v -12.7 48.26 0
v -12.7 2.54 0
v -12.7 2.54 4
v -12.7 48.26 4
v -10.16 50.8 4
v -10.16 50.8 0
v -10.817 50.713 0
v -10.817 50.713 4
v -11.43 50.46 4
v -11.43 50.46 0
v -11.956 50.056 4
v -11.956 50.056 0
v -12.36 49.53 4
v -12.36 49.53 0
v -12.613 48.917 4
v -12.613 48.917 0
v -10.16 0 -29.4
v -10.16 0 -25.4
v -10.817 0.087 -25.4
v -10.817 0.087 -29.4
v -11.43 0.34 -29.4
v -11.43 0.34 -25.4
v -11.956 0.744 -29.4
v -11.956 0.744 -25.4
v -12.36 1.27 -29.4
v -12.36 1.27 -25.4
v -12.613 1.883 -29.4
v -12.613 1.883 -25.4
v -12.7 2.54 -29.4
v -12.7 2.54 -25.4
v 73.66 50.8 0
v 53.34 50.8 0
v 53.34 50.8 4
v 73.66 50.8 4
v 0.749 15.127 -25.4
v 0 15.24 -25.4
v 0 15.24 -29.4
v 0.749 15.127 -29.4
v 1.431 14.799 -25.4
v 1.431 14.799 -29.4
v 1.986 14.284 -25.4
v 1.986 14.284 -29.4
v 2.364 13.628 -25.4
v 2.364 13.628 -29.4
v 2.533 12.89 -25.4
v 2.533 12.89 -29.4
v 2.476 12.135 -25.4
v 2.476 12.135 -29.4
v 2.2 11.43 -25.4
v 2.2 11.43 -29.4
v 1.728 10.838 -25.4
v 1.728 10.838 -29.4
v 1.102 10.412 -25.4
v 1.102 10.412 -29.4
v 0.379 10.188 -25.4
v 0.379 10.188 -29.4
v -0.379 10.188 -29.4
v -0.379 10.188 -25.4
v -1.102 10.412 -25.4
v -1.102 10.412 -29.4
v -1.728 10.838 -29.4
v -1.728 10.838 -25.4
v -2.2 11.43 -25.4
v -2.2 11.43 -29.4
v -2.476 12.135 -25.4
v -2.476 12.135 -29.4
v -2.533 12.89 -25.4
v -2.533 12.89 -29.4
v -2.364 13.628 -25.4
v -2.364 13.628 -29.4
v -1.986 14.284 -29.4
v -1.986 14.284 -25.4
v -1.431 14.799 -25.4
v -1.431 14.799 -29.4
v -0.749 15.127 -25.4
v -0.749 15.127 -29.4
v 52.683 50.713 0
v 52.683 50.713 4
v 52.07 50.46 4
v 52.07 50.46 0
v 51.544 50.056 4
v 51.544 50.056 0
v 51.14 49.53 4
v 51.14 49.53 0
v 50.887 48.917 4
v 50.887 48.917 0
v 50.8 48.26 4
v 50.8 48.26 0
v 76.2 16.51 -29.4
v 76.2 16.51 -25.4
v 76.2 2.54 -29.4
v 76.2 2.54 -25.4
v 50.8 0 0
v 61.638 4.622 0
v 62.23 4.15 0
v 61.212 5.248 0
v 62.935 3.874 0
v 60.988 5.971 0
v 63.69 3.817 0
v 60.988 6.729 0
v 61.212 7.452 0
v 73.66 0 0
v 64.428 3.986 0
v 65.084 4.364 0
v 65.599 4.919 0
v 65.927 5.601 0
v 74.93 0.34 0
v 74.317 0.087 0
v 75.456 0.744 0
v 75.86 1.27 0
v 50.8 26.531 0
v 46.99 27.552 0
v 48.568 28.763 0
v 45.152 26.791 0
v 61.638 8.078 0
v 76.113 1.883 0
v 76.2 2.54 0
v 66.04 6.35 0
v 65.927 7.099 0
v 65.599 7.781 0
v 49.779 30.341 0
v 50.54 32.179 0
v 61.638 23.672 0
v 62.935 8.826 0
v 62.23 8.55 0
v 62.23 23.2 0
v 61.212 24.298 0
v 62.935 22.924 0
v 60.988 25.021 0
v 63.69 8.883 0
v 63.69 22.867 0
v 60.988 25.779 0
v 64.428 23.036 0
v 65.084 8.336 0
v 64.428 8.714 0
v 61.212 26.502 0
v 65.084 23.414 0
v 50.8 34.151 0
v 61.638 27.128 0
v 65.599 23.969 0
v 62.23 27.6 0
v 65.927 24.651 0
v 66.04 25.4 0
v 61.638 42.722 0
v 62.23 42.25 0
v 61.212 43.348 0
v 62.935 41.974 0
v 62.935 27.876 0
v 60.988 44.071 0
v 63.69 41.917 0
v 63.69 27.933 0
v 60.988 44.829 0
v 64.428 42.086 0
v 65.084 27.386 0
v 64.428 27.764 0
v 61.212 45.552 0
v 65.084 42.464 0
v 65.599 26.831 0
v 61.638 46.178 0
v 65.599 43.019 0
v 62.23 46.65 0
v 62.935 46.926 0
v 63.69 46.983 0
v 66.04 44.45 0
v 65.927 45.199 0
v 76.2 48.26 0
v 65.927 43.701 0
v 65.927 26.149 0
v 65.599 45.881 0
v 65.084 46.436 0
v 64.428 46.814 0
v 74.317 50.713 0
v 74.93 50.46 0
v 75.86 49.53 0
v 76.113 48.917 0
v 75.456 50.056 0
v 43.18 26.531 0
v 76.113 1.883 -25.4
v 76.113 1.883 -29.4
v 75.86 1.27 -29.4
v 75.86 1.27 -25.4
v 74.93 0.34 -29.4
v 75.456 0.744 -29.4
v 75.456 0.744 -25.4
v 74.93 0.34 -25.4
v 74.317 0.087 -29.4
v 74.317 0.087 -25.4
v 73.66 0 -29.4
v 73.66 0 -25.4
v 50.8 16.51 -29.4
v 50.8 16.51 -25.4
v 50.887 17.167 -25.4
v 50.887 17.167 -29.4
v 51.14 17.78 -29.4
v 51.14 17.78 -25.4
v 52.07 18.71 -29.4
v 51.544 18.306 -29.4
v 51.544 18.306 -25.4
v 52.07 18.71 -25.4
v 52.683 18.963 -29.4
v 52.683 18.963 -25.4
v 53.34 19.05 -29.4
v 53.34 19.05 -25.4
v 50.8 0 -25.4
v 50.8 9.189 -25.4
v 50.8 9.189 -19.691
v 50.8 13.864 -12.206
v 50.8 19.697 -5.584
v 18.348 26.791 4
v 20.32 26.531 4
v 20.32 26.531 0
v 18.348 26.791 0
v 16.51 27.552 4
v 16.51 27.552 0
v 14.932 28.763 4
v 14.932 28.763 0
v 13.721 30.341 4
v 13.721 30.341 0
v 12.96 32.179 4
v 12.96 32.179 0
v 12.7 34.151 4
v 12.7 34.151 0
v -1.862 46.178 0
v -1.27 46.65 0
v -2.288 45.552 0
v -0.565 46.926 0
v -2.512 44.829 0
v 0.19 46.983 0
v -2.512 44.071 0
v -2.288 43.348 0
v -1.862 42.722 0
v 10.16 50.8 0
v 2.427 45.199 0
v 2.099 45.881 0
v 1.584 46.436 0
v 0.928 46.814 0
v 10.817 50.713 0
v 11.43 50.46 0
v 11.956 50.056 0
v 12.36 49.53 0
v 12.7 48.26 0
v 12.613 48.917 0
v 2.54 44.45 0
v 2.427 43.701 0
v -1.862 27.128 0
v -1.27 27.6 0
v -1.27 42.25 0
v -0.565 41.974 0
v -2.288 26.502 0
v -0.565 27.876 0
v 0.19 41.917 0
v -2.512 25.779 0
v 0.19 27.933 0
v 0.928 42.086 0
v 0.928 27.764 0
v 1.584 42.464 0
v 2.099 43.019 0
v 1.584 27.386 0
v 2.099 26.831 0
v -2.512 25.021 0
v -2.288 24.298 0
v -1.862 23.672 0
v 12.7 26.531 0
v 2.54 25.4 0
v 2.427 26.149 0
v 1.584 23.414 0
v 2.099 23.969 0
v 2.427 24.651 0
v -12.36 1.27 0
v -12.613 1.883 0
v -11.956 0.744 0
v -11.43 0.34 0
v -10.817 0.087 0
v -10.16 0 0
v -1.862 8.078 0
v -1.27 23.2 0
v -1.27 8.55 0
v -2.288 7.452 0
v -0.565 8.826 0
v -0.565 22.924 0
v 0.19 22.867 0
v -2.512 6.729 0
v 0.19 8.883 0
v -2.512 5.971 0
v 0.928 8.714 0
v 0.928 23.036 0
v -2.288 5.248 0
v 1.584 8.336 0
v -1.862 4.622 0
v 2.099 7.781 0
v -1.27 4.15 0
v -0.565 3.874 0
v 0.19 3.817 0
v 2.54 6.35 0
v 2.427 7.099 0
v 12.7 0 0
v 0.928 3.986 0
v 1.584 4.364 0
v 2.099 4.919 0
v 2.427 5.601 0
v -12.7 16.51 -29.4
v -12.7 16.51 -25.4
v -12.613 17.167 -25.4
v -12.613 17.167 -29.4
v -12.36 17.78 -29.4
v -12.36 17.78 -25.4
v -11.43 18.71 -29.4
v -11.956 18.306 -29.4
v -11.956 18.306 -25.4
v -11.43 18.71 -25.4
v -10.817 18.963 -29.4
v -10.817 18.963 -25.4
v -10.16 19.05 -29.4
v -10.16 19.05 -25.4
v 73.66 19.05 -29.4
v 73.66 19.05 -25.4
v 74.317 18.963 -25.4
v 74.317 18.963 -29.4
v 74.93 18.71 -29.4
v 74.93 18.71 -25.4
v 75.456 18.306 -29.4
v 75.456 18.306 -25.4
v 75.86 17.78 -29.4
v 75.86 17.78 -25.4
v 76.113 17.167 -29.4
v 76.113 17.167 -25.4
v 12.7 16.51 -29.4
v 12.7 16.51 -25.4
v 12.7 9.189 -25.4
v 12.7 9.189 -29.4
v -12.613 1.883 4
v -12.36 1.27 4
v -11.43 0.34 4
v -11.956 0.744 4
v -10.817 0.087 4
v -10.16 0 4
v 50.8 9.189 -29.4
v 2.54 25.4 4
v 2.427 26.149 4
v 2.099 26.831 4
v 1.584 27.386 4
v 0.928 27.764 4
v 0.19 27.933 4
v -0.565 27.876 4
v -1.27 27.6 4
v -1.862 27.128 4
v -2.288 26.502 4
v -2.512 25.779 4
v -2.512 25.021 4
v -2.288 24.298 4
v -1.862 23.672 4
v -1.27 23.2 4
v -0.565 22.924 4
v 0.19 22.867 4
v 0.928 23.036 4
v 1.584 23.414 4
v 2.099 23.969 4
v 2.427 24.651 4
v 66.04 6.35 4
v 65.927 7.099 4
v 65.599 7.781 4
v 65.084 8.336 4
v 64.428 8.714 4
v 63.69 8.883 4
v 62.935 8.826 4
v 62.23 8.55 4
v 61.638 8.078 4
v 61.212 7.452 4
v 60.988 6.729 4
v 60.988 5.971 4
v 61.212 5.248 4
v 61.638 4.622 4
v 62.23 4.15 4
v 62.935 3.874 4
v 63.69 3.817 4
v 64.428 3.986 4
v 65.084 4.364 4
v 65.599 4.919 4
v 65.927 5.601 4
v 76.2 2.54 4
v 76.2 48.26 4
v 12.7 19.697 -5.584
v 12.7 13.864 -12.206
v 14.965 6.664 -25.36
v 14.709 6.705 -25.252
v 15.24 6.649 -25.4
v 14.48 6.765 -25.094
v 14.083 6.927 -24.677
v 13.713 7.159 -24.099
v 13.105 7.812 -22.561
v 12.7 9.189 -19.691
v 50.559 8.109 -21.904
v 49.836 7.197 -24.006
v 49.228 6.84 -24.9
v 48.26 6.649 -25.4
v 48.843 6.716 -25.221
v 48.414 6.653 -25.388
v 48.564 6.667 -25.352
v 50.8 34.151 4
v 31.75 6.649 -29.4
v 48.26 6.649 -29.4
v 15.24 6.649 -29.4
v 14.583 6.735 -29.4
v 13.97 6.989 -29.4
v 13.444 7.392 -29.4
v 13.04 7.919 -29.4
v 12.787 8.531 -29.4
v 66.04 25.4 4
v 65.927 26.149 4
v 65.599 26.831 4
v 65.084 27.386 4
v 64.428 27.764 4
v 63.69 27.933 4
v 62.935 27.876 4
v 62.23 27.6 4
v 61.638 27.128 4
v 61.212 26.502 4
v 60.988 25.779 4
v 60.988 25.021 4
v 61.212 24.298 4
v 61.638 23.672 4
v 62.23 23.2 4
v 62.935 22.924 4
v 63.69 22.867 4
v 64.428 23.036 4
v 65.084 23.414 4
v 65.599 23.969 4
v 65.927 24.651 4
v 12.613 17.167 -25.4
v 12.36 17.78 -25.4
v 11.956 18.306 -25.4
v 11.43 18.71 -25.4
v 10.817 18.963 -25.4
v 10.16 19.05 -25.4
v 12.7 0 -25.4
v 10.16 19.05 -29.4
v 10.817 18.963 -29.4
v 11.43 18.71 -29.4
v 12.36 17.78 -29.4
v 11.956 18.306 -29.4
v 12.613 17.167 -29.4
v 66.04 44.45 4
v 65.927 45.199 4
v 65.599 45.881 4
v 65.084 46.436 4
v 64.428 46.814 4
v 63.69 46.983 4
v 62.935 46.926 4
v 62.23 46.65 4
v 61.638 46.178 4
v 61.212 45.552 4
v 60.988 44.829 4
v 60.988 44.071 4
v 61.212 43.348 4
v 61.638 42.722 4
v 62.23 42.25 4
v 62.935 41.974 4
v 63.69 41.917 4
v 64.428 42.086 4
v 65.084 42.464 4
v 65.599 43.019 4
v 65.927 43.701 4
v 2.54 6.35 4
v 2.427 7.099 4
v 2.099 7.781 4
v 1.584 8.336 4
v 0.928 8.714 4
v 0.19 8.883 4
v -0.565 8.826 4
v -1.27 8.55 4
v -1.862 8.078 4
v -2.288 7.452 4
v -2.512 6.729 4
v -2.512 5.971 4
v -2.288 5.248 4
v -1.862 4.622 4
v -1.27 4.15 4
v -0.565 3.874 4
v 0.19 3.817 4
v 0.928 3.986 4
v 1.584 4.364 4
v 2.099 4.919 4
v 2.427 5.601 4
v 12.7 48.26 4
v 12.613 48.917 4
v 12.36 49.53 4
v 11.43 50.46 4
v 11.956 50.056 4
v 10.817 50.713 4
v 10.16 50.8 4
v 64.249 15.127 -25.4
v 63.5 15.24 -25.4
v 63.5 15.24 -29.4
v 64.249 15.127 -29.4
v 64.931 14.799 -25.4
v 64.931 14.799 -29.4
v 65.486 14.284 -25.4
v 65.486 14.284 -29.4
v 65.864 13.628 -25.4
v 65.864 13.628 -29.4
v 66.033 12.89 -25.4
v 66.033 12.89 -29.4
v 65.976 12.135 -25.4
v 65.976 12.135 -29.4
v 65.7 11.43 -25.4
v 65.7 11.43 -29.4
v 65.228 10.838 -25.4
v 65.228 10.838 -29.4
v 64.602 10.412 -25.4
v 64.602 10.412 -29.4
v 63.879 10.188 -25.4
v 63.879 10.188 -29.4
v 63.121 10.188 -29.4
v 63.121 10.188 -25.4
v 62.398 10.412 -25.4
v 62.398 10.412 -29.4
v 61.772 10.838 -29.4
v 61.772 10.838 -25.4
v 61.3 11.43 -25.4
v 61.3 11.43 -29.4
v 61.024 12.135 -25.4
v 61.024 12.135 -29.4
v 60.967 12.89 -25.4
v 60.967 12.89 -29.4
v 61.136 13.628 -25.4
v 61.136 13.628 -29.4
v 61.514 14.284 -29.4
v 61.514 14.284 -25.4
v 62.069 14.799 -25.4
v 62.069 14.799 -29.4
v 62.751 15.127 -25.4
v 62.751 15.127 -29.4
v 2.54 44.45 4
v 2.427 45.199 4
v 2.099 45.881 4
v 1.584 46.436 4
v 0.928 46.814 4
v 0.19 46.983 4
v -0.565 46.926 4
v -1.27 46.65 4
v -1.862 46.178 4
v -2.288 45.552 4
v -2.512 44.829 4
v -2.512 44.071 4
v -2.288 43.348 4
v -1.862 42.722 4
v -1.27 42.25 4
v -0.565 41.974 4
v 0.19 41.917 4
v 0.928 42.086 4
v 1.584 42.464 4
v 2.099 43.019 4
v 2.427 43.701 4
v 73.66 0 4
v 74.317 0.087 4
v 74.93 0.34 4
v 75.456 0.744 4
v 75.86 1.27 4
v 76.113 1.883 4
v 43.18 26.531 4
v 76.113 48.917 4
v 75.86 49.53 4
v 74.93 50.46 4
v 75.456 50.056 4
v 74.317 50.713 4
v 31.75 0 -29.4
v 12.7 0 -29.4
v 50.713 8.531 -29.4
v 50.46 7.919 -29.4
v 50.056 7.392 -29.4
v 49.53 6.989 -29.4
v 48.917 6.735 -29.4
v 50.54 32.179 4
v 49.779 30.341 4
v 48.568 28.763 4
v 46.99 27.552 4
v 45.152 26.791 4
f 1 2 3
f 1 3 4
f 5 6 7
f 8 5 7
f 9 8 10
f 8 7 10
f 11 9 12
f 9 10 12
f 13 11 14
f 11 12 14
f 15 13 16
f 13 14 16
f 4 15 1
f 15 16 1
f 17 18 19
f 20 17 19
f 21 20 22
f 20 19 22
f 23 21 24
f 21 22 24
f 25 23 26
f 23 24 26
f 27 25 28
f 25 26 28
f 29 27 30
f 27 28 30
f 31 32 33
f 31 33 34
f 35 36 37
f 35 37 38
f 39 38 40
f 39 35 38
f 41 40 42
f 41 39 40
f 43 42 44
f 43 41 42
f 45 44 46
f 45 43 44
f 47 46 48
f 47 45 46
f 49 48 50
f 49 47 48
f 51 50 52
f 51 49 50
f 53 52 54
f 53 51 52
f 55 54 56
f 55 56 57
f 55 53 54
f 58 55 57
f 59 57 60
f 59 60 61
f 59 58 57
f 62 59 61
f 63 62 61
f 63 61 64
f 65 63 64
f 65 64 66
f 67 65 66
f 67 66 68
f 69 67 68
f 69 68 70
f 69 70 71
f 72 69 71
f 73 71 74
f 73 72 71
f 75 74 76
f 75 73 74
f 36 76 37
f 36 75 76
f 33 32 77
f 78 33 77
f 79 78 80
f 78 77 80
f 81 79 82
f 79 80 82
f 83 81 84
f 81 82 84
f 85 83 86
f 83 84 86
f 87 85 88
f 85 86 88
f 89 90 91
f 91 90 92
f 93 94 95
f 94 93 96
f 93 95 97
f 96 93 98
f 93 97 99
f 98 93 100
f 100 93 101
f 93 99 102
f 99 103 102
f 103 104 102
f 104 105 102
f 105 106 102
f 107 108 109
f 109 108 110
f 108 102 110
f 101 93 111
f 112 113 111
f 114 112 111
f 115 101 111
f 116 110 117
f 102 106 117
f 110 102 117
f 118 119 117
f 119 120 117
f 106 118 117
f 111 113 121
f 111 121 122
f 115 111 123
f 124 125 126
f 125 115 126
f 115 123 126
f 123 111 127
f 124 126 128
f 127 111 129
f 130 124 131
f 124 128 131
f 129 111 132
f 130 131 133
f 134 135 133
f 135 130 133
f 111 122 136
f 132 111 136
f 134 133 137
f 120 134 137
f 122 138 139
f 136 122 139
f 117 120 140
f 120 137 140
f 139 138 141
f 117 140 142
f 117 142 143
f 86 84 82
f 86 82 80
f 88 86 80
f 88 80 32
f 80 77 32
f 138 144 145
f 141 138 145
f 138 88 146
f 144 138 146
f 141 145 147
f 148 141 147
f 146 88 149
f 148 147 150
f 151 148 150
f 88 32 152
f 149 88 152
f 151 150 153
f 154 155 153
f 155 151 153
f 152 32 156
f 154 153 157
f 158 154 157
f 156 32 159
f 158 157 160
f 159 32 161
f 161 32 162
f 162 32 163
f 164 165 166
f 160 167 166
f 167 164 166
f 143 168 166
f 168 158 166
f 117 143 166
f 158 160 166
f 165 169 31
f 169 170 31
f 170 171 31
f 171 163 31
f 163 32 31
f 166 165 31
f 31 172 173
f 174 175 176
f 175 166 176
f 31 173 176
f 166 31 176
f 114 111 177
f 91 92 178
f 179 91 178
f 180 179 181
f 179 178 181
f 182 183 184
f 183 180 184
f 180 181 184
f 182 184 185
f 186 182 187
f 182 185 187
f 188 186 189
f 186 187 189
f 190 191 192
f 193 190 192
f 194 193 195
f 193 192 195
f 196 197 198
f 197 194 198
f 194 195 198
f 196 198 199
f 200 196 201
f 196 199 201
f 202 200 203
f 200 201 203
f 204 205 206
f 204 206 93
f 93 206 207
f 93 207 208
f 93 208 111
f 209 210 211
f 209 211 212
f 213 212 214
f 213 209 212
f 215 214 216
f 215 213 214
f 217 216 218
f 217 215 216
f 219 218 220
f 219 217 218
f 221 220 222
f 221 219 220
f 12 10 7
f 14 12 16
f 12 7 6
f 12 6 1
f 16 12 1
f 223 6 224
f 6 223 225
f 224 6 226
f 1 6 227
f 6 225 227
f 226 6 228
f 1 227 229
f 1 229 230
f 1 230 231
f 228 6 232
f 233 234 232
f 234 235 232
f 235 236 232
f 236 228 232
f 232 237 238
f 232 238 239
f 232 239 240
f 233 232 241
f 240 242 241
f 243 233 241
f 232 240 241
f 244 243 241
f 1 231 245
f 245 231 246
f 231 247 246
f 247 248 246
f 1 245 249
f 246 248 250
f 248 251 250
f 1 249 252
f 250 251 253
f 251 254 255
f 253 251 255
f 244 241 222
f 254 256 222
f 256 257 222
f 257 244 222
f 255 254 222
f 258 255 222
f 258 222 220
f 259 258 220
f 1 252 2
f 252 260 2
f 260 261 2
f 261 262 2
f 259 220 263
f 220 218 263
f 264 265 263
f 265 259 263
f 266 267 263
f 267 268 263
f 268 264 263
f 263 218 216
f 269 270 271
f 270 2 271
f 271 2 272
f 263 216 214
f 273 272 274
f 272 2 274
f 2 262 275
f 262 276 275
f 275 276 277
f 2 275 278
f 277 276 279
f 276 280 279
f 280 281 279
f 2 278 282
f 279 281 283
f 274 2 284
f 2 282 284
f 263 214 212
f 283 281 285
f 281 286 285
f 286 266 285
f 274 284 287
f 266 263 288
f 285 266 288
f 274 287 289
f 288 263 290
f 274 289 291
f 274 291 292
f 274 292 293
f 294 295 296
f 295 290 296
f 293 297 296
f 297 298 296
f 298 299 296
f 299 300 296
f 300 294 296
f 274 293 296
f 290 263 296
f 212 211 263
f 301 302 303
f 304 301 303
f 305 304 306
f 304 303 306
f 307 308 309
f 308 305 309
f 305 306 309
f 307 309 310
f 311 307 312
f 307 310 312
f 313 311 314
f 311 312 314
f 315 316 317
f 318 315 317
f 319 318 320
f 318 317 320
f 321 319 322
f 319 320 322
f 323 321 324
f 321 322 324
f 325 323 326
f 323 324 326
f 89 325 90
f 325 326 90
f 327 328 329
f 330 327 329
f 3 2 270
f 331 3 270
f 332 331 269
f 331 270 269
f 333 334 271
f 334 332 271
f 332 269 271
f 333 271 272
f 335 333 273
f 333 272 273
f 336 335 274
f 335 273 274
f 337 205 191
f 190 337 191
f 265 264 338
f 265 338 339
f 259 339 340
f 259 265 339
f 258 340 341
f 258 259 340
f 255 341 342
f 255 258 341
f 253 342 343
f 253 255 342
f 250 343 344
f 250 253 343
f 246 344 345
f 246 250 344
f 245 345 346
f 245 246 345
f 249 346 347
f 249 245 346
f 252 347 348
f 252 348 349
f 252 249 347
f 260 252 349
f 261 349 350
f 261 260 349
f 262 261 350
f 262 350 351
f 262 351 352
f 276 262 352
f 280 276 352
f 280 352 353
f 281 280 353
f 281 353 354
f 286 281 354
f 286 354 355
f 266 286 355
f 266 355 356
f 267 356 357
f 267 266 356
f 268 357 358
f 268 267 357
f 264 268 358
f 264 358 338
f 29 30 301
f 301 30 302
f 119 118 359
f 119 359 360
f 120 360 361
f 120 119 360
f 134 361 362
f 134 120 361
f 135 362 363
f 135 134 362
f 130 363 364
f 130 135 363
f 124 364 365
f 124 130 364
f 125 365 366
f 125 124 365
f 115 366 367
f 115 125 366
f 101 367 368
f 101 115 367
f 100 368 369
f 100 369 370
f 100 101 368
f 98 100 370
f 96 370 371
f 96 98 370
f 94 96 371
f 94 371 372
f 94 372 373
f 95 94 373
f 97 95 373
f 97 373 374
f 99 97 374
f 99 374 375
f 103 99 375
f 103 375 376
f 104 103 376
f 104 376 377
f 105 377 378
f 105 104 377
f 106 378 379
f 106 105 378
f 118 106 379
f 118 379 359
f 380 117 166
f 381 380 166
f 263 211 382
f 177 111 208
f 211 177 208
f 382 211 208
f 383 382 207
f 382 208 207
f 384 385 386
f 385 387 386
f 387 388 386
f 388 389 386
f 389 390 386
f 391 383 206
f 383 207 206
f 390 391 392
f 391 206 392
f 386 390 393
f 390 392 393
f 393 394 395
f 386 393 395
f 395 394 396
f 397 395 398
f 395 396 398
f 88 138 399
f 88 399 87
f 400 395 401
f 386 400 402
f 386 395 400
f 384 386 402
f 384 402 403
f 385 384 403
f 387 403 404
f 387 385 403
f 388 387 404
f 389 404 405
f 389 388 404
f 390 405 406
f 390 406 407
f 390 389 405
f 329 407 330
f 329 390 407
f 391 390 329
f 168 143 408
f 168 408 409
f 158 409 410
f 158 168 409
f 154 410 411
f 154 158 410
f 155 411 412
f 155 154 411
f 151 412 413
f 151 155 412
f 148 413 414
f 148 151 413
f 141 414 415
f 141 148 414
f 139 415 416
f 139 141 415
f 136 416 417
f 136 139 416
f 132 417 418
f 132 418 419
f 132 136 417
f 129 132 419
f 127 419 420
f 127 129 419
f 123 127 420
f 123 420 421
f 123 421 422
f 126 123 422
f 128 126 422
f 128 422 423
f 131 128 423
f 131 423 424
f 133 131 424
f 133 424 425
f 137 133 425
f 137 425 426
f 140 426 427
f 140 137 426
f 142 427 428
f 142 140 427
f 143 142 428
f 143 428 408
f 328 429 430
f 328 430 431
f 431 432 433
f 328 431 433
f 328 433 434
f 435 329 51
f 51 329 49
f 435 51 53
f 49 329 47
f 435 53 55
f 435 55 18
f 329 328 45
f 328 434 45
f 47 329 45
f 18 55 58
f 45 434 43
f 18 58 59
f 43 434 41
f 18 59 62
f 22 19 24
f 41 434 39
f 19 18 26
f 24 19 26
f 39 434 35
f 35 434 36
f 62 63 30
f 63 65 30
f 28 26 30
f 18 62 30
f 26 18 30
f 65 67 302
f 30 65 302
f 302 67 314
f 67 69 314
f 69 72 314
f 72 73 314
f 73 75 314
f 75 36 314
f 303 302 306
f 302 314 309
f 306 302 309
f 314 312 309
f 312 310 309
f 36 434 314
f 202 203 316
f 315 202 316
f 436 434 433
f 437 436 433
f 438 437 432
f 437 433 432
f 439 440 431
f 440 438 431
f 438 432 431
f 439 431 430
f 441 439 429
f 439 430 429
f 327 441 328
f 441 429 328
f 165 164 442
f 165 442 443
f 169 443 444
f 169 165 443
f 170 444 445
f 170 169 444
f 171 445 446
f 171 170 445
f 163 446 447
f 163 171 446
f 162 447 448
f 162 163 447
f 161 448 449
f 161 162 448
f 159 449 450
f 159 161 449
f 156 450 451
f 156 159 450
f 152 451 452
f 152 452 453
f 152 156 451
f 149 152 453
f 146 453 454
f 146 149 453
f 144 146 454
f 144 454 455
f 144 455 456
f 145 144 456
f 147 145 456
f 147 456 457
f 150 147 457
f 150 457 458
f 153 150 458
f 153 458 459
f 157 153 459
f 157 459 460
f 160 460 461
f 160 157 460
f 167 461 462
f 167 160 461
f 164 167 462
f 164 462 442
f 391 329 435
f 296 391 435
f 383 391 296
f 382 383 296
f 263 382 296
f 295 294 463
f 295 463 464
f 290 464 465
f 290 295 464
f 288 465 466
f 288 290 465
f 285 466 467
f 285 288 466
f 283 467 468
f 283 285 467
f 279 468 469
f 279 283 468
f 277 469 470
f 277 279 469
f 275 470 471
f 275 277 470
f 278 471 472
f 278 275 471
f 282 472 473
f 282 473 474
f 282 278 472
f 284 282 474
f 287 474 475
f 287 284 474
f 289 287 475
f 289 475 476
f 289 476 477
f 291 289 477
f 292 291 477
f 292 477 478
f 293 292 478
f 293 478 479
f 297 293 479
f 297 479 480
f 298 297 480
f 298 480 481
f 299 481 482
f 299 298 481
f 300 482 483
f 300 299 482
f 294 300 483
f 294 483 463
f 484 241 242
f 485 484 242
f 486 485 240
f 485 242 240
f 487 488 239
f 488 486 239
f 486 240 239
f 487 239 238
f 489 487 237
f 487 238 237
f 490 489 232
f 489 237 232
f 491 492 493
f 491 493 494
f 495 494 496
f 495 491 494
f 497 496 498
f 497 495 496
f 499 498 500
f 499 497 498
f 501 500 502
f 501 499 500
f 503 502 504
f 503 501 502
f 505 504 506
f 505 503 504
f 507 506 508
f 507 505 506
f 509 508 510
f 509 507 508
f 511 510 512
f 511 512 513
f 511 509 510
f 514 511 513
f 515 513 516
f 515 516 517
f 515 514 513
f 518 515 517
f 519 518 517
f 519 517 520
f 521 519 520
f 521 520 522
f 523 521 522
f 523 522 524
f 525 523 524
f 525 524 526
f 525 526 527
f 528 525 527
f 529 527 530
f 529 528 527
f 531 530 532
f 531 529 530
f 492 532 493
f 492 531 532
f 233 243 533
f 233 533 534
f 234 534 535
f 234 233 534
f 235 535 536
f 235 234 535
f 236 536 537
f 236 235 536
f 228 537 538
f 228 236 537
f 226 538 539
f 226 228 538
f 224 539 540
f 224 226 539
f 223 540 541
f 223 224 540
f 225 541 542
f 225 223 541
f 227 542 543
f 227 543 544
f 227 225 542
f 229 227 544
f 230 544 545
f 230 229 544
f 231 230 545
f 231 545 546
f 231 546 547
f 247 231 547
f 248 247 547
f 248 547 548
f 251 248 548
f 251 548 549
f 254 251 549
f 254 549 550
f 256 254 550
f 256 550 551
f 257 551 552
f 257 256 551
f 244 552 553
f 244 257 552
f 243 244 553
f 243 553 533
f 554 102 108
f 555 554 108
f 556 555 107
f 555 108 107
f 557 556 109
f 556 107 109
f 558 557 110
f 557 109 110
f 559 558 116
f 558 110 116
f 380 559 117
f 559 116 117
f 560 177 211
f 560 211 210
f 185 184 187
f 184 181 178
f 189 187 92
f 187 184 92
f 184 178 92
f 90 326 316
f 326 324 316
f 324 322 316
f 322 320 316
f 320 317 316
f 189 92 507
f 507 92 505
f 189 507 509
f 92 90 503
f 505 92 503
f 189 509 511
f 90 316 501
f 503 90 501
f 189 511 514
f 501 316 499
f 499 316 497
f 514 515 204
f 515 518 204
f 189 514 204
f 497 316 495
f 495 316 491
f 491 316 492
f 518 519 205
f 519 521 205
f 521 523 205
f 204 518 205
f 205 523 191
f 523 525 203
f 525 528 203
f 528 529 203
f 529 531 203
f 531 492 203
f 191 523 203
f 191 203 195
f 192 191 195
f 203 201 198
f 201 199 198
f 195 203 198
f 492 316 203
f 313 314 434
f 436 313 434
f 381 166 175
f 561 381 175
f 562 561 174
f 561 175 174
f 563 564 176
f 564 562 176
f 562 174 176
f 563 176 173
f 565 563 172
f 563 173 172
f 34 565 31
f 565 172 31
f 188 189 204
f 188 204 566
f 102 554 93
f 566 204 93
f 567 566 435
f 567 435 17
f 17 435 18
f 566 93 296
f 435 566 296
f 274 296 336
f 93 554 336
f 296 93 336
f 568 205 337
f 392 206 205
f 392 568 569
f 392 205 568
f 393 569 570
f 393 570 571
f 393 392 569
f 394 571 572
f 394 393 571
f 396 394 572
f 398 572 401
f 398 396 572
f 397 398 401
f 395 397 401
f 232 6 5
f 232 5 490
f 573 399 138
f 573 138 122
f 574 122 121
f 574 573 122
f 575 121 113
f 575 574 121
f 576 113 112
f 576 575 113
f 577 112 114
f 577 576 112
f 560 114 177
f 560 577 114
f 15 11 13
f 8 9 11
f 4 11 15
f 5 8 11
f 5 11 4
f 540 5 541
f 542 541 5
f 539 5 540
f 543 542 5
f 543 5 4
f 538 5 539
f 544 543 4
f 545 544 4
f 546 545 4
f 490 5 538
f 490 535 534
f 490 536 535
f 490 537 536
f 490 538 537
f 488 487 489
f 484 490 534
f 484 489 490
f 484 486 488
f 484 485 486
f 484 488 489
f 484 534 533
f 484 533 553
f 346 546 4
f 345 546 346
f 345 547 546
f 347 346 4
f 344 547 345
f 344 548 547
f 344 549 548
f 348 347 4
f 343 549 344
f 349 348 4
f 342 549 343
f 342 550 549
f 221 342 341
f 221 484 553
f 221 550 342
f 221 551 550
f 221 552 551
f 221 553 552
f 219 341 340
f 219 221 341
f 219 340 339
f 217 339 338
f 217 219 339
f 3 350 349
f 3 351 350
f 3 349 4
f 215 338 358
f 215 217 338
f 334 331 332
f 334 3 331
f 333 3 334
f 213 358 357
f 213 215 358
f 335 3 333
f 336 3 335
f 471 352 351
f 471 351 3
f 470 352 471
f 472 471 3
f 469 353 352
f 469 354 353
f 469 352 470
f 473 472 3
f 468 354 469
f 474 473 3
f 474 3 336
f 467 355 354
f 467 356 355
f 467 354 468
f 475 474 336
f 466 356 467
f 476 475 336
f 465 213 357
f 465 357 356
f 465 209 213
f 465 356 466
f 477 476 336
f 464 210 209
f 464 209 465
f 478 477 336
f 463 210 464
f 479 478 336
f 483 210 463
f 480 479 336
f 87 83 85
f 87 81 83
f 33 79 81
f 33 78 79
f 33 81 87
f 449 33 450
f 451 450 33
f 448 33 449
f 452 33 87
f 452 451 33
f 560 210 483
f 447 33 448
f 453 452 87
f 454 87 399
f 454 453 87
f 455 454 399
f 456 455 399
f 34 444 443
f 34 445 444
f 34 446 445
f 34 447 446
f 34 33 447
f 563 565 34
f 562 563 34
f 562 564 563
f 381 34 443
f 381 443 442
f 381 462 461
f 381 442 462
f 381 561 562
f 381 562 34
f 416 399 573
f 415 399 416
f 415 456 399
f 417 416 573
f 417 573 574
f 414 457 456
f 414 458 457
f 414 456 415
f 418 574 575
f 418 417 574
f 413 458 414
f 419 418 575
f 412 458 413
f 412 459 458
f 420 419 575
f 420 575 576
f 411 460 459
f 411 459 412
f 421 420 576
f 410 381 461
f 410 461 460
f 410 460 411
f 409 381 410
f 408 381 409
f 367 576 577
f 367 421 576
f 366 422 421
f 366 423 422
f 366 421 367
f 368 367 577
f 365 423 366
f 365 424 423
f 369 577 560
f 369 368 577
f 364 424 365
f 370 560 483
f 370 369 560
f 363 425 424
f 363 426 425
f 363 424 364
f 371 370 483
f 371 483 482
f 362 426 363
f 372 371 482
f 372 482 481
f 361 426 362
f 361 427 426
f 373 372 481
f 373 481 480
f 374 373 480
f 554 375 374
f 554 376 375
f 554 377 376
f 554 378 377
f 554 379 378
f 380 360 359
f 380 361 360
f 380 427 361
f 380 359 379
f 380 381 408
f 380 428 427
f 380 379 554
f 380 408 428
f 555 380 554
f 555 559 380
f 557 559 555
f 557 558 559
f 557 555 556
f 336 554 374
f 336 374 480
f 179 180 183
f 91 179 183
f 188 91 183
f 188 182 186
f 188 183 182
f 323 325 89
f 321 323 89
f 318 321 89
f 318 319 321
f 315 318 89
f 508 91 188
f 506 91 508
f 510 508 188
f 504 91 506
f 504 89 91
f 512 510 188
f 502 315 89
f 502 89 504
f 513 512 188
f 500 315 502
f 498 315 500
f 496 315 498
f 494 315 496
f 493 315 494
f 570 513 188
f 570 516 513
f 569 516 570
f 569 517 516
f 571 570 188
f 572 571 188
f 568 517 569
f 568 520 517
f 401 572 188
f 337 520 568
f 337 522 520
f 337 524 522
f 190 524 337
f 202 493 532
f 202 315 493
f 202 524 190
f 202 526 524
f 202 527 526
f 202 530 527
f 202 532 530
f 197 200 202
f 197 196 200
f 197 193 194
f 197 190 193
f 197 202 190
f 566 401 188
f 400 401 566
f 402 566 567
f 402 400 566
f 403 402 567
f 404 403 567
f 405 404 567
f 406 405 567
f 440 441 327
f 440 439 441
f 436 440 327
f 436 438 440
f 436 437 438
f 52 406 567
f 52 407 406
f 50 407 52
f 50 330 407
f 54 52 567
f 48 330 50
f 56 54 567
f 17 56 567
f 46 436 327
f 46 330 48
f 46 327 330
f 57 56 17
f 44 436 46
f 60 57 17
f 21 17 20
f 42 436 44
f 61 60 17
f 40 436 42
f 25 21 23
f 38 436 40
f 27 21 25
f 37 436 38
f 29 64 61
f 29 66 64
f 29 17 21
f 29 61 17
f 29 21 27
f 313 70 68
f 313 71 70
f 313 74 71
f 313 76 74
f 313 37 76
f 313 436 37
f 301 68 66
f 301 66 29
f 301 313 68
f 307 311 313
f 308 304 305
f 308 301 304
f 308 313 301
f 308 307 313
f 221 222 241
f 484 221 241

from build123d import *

# Parameters (mm, degrees)
SKETCH1_W             = 25.4
SKETCH1_H             = 50.8
SKETCH1_R             = 2.54
BOSS_EXTRUDE1_DEPTH   = 4
BOSS_EXTRUDE1_2_DEPTH = 4
SKETCH2_W             = 4
SKETCH2_H             = 26.531408834
BOSS_EXTRUDE2_DEPTH   = 38.1
SKETCH3_R             = 2.54
SKETCH3_W             = 19.05
SKETCH3_H             = 6.648533437
BOSS_EXTRUDE3_DEPTH   = 4
FILLET1_R             = 7.62
FILLET2_R             = 2.54


with BuildPart() as part:
    # Sketch1 → Boss-Extrude1 (new body)
    with BuildSketch(Plane.XY):
        with Locations((0, 25.4)):
            Rectangle(SKETCH1_W, SKETCH1_H)
        with Locations((0, 44.45)):
            Circle(SKETCH1_R, mode=Mode.SUBTRACT)
        with Locations((0, 25.4)):
            Circle(SKETCH1_R, mode=Mode.SUBTRACT)
        with Locations((0, 6.35)):
            Circle(SKETCH1_R, mode=Mode.SUBTRACT)
    extrude(amount=BOSS_EXTRUDE1_DEPTH)



with BuildPart() as body_2:
    # Sketch1 → Boss-Extrude1 2 (new body)
    with BuildSketch(Plane.XY):
        with Locations((63.5, 25.4)):
            Rectangle(SKETCH1_W, SKETCH1_H)
        with Locations((63.5, 25.4)):
            Circle(SKETCH1_R, mode=Mode.SUBTRACT)
        with Locations((63.5, 44.45)):
            Circle(SKETCH1_R, mode=Mode.SUBTRACT)
        with Locations((63.5, 6.35)):
            Circle(SKETCH1_R, mode=Mode.SUBTRACT)
    extrude(amount=BOSS_EXTRUDE1_2_DEPTH)


with BuildPart() as part_1:
    add(part.part)

    add(body_2.part)  # Boss-Extrude2 merges body 2
    # Sketch2 → Boss-Extrude2 (add)
    with BuildSketch(Plane.ZY.offset(-50.8)):
        with BuildLine():
            Line((0, 0), (0, 26.531408834))
            ThreePointArc((0, 26.531408834), (-11.179973196, 14.648165434), (-25.4, 6.648533437))
            Line((-25.4, 6.648533437), (-25.4, 0))
            Line((-25.4, 0), (0, 0))
        make_face()
        with Locations((2, 13.265704417)):
            Rectangle(SKETCH2_W, SKETCH2_H)
    extrude(amount=BOSS_EXTRUDE2_DEPTH)

    # Sketch3 → Boss-Extrude3 (add)
    # profile 1 of 3: a face of its own
    with BuildSketch(Plane(origin=(0, 0, -25.4), x_dir=(-1, 0, 0), z_dir=(0, 0, -1))):
        Polygon((-12.7, 6.648533437), (-12.7, 0), (12.7, 0), (12.7, 19.05), (-12.7, 19.05), align=None)
        with Locations(Location((0, 12.7, 0), (0, 0, 90))):
            Circle(SKETCH3_R, mode=Mode.SUBTRACT)
    # profile 2 of 3: a face of its own
    with BuildSketch(Plane(origin=(0, 0, -25.4), x_dir=(-1, 0, 0), z_dir=(0, 0, -1))):
        with Locations((-22.225, 3.324266719)):
            Rectangle(SKETCH3_W, SKETCH3_H)
    # profile 3 of 3: a face of its own
    with BuildSketch(Plane(origin=(0, 0, -25.4), x_dir=(-1, 0, 0), z_dir=(0, 0, -1))):
        Polygon((-76.2, 0), (-31.75, 0), (-31.75, 6.648533437), (-50.8, 6.648533437), (-50.8, 19.05), (-76.2, 19.05), align=None)
        with Locations(Location((-63.5, 12.7, 0), (0, 0, 90))):
            Circle(SKETCH3_R, mode=Mode.SUBTRACT)
    extrude(amount=BOSS_EXTRUDE3_DEPTH)

    # Fillet1
    # the kernel refuses this fillet: 7.62 mm, written as the material it adds along each edge
    with BuildSketch(Plane(origin=(12.7, 26.531408834, 4), x_dir=(0, 1, 0), z_dir=(0, 0, -1)), Plane(origin=(50.8, 26.531408834, 4), x_dir=(-1, 0, 0), z_dir=(0, 0, -1))) as fillet1_piece_1:
        with BuildLine():
            CenterArc((FILLET1_R, FILLET1_R), FILLET1_R, 180, 90)
            Line((0, FILLET1_R), (0, 0))
            Line((0, 0), (FILLET1_R, 0))
        make_face()
    extrude(amount=4)

    # Fillet2
    # the kernel refuses this fillet: 2.54 mm, written as the material it adds along each edge
    with BuildSketch(Plane(origin=(12.7, 6.648533437, -19.05), x_dir=(1, 0, 0), z_dir=(0, 0, -1))) as fillet2_piece_1:
        with BuildLine():
            CenterArc((FILLET2_R, -FILLET2_R), FILLET2_R, 90, 90)
            Line((0, -FILLET2_R), (0, 0))
            Line((0, 0), (FILLET2_R, 0))
        make_face()
    extrude(amount=10.35)
    with BuildSketch(Plane(origin=(50.8, 6.648533437, -19.05), x_dir=(-1, 0, 0), z_dir=(0, 0, -1))) as fillet2_piece_2:
        with BuildLine():
            CenterArc((FILLET2_R, FILLET2_R), FILLET2_R, 180, 90)
            Line((0, FILLET2_R), (0, 0))
            Line((0, 0), (FILLET2_R, 0))
        make_face()
    extrude(amount=10.35)
    # the kernel refuses this fillet: 2.54 mm, written as the material it takes off along each edge
    with BuildSketch(Plane(origin=(12.7, 50.8, -6.35), x_dir=(-1, 0, 0), z_dir=(0, 0, 1)), Plane(origin=(-12.7, 0, -6.35), x_dir=(1, 0, 0), z_dir=(0, 0, 1)), Plane(origin=(76.2, 0, -6.35), x_dir=(0, 1, 0), z_dir=(0, 0, 1)), Plane(origin=(76.2, 50.8, -6.35), x_dir=(-1, 0, 0), z_dir=(0, 0, 1)), Plane(origin=(-12.7, 19.05, -19.05), x_dir=(1, 0, 0), z_dir=(0, 0, -1)), Plane(origin=(12.7, 19.05, -19.05), x_dir=(0, -1, 0), z_dir=(0, 0, -1)), Plane(origin=(50.8, 19.05, -19.05), x_dir=(1, 0, 0), z_dir=(0, 0, -1)), Plane(origin=(76.2, 0, -19.05), x_dir=(-1, 0, 0), z_dir=(0, 0, -1))) as fillet2_2_piece_1:
        with BuildLine():
            CenterArc((FILLET2_R, FILLET2_R), FILLET2_R, 180, 90)
            Line((0, FILLET2_R), (0, 0))
            Line((0, 0), (FILLET2_R, 0))
        make_face()
    extrude(amount=16.7, mode=Mode.SUBTRACT)
    with BuildSketch(Plane(origin=(-12.7, 50.8, -6.35), x_dir=(1, 0, 0), z_dir=(0, 0, 1)), Plane(origin=(50.8, 50.8, -6.35), x_dir=(1, 0, 0), z_dir=(0, 0, 1)), Plane(origin=(-12.7, 0, -19.05), x_dir=(1, 0, 0), z_dir=(0, 0, -1)), Plane(origin=(76.2, 19.05, -19.05), x_dir=(-1, 0, 0), z_dir=(0, 0, -1))) as fillet2_2_piece_2:
        with BuildLine():
            CenterArc((FILLET2_R, -FILLET2_R), FILLET2_R, 90, 90)
            Line((0, -FILLET2_R), (0, 0))
            Line((0, 0), (FILLET2_R, 0))
        make_face()
    extrude(amount=16.7, mode=Mode.SUBTRACT)


solid = part_1.part
